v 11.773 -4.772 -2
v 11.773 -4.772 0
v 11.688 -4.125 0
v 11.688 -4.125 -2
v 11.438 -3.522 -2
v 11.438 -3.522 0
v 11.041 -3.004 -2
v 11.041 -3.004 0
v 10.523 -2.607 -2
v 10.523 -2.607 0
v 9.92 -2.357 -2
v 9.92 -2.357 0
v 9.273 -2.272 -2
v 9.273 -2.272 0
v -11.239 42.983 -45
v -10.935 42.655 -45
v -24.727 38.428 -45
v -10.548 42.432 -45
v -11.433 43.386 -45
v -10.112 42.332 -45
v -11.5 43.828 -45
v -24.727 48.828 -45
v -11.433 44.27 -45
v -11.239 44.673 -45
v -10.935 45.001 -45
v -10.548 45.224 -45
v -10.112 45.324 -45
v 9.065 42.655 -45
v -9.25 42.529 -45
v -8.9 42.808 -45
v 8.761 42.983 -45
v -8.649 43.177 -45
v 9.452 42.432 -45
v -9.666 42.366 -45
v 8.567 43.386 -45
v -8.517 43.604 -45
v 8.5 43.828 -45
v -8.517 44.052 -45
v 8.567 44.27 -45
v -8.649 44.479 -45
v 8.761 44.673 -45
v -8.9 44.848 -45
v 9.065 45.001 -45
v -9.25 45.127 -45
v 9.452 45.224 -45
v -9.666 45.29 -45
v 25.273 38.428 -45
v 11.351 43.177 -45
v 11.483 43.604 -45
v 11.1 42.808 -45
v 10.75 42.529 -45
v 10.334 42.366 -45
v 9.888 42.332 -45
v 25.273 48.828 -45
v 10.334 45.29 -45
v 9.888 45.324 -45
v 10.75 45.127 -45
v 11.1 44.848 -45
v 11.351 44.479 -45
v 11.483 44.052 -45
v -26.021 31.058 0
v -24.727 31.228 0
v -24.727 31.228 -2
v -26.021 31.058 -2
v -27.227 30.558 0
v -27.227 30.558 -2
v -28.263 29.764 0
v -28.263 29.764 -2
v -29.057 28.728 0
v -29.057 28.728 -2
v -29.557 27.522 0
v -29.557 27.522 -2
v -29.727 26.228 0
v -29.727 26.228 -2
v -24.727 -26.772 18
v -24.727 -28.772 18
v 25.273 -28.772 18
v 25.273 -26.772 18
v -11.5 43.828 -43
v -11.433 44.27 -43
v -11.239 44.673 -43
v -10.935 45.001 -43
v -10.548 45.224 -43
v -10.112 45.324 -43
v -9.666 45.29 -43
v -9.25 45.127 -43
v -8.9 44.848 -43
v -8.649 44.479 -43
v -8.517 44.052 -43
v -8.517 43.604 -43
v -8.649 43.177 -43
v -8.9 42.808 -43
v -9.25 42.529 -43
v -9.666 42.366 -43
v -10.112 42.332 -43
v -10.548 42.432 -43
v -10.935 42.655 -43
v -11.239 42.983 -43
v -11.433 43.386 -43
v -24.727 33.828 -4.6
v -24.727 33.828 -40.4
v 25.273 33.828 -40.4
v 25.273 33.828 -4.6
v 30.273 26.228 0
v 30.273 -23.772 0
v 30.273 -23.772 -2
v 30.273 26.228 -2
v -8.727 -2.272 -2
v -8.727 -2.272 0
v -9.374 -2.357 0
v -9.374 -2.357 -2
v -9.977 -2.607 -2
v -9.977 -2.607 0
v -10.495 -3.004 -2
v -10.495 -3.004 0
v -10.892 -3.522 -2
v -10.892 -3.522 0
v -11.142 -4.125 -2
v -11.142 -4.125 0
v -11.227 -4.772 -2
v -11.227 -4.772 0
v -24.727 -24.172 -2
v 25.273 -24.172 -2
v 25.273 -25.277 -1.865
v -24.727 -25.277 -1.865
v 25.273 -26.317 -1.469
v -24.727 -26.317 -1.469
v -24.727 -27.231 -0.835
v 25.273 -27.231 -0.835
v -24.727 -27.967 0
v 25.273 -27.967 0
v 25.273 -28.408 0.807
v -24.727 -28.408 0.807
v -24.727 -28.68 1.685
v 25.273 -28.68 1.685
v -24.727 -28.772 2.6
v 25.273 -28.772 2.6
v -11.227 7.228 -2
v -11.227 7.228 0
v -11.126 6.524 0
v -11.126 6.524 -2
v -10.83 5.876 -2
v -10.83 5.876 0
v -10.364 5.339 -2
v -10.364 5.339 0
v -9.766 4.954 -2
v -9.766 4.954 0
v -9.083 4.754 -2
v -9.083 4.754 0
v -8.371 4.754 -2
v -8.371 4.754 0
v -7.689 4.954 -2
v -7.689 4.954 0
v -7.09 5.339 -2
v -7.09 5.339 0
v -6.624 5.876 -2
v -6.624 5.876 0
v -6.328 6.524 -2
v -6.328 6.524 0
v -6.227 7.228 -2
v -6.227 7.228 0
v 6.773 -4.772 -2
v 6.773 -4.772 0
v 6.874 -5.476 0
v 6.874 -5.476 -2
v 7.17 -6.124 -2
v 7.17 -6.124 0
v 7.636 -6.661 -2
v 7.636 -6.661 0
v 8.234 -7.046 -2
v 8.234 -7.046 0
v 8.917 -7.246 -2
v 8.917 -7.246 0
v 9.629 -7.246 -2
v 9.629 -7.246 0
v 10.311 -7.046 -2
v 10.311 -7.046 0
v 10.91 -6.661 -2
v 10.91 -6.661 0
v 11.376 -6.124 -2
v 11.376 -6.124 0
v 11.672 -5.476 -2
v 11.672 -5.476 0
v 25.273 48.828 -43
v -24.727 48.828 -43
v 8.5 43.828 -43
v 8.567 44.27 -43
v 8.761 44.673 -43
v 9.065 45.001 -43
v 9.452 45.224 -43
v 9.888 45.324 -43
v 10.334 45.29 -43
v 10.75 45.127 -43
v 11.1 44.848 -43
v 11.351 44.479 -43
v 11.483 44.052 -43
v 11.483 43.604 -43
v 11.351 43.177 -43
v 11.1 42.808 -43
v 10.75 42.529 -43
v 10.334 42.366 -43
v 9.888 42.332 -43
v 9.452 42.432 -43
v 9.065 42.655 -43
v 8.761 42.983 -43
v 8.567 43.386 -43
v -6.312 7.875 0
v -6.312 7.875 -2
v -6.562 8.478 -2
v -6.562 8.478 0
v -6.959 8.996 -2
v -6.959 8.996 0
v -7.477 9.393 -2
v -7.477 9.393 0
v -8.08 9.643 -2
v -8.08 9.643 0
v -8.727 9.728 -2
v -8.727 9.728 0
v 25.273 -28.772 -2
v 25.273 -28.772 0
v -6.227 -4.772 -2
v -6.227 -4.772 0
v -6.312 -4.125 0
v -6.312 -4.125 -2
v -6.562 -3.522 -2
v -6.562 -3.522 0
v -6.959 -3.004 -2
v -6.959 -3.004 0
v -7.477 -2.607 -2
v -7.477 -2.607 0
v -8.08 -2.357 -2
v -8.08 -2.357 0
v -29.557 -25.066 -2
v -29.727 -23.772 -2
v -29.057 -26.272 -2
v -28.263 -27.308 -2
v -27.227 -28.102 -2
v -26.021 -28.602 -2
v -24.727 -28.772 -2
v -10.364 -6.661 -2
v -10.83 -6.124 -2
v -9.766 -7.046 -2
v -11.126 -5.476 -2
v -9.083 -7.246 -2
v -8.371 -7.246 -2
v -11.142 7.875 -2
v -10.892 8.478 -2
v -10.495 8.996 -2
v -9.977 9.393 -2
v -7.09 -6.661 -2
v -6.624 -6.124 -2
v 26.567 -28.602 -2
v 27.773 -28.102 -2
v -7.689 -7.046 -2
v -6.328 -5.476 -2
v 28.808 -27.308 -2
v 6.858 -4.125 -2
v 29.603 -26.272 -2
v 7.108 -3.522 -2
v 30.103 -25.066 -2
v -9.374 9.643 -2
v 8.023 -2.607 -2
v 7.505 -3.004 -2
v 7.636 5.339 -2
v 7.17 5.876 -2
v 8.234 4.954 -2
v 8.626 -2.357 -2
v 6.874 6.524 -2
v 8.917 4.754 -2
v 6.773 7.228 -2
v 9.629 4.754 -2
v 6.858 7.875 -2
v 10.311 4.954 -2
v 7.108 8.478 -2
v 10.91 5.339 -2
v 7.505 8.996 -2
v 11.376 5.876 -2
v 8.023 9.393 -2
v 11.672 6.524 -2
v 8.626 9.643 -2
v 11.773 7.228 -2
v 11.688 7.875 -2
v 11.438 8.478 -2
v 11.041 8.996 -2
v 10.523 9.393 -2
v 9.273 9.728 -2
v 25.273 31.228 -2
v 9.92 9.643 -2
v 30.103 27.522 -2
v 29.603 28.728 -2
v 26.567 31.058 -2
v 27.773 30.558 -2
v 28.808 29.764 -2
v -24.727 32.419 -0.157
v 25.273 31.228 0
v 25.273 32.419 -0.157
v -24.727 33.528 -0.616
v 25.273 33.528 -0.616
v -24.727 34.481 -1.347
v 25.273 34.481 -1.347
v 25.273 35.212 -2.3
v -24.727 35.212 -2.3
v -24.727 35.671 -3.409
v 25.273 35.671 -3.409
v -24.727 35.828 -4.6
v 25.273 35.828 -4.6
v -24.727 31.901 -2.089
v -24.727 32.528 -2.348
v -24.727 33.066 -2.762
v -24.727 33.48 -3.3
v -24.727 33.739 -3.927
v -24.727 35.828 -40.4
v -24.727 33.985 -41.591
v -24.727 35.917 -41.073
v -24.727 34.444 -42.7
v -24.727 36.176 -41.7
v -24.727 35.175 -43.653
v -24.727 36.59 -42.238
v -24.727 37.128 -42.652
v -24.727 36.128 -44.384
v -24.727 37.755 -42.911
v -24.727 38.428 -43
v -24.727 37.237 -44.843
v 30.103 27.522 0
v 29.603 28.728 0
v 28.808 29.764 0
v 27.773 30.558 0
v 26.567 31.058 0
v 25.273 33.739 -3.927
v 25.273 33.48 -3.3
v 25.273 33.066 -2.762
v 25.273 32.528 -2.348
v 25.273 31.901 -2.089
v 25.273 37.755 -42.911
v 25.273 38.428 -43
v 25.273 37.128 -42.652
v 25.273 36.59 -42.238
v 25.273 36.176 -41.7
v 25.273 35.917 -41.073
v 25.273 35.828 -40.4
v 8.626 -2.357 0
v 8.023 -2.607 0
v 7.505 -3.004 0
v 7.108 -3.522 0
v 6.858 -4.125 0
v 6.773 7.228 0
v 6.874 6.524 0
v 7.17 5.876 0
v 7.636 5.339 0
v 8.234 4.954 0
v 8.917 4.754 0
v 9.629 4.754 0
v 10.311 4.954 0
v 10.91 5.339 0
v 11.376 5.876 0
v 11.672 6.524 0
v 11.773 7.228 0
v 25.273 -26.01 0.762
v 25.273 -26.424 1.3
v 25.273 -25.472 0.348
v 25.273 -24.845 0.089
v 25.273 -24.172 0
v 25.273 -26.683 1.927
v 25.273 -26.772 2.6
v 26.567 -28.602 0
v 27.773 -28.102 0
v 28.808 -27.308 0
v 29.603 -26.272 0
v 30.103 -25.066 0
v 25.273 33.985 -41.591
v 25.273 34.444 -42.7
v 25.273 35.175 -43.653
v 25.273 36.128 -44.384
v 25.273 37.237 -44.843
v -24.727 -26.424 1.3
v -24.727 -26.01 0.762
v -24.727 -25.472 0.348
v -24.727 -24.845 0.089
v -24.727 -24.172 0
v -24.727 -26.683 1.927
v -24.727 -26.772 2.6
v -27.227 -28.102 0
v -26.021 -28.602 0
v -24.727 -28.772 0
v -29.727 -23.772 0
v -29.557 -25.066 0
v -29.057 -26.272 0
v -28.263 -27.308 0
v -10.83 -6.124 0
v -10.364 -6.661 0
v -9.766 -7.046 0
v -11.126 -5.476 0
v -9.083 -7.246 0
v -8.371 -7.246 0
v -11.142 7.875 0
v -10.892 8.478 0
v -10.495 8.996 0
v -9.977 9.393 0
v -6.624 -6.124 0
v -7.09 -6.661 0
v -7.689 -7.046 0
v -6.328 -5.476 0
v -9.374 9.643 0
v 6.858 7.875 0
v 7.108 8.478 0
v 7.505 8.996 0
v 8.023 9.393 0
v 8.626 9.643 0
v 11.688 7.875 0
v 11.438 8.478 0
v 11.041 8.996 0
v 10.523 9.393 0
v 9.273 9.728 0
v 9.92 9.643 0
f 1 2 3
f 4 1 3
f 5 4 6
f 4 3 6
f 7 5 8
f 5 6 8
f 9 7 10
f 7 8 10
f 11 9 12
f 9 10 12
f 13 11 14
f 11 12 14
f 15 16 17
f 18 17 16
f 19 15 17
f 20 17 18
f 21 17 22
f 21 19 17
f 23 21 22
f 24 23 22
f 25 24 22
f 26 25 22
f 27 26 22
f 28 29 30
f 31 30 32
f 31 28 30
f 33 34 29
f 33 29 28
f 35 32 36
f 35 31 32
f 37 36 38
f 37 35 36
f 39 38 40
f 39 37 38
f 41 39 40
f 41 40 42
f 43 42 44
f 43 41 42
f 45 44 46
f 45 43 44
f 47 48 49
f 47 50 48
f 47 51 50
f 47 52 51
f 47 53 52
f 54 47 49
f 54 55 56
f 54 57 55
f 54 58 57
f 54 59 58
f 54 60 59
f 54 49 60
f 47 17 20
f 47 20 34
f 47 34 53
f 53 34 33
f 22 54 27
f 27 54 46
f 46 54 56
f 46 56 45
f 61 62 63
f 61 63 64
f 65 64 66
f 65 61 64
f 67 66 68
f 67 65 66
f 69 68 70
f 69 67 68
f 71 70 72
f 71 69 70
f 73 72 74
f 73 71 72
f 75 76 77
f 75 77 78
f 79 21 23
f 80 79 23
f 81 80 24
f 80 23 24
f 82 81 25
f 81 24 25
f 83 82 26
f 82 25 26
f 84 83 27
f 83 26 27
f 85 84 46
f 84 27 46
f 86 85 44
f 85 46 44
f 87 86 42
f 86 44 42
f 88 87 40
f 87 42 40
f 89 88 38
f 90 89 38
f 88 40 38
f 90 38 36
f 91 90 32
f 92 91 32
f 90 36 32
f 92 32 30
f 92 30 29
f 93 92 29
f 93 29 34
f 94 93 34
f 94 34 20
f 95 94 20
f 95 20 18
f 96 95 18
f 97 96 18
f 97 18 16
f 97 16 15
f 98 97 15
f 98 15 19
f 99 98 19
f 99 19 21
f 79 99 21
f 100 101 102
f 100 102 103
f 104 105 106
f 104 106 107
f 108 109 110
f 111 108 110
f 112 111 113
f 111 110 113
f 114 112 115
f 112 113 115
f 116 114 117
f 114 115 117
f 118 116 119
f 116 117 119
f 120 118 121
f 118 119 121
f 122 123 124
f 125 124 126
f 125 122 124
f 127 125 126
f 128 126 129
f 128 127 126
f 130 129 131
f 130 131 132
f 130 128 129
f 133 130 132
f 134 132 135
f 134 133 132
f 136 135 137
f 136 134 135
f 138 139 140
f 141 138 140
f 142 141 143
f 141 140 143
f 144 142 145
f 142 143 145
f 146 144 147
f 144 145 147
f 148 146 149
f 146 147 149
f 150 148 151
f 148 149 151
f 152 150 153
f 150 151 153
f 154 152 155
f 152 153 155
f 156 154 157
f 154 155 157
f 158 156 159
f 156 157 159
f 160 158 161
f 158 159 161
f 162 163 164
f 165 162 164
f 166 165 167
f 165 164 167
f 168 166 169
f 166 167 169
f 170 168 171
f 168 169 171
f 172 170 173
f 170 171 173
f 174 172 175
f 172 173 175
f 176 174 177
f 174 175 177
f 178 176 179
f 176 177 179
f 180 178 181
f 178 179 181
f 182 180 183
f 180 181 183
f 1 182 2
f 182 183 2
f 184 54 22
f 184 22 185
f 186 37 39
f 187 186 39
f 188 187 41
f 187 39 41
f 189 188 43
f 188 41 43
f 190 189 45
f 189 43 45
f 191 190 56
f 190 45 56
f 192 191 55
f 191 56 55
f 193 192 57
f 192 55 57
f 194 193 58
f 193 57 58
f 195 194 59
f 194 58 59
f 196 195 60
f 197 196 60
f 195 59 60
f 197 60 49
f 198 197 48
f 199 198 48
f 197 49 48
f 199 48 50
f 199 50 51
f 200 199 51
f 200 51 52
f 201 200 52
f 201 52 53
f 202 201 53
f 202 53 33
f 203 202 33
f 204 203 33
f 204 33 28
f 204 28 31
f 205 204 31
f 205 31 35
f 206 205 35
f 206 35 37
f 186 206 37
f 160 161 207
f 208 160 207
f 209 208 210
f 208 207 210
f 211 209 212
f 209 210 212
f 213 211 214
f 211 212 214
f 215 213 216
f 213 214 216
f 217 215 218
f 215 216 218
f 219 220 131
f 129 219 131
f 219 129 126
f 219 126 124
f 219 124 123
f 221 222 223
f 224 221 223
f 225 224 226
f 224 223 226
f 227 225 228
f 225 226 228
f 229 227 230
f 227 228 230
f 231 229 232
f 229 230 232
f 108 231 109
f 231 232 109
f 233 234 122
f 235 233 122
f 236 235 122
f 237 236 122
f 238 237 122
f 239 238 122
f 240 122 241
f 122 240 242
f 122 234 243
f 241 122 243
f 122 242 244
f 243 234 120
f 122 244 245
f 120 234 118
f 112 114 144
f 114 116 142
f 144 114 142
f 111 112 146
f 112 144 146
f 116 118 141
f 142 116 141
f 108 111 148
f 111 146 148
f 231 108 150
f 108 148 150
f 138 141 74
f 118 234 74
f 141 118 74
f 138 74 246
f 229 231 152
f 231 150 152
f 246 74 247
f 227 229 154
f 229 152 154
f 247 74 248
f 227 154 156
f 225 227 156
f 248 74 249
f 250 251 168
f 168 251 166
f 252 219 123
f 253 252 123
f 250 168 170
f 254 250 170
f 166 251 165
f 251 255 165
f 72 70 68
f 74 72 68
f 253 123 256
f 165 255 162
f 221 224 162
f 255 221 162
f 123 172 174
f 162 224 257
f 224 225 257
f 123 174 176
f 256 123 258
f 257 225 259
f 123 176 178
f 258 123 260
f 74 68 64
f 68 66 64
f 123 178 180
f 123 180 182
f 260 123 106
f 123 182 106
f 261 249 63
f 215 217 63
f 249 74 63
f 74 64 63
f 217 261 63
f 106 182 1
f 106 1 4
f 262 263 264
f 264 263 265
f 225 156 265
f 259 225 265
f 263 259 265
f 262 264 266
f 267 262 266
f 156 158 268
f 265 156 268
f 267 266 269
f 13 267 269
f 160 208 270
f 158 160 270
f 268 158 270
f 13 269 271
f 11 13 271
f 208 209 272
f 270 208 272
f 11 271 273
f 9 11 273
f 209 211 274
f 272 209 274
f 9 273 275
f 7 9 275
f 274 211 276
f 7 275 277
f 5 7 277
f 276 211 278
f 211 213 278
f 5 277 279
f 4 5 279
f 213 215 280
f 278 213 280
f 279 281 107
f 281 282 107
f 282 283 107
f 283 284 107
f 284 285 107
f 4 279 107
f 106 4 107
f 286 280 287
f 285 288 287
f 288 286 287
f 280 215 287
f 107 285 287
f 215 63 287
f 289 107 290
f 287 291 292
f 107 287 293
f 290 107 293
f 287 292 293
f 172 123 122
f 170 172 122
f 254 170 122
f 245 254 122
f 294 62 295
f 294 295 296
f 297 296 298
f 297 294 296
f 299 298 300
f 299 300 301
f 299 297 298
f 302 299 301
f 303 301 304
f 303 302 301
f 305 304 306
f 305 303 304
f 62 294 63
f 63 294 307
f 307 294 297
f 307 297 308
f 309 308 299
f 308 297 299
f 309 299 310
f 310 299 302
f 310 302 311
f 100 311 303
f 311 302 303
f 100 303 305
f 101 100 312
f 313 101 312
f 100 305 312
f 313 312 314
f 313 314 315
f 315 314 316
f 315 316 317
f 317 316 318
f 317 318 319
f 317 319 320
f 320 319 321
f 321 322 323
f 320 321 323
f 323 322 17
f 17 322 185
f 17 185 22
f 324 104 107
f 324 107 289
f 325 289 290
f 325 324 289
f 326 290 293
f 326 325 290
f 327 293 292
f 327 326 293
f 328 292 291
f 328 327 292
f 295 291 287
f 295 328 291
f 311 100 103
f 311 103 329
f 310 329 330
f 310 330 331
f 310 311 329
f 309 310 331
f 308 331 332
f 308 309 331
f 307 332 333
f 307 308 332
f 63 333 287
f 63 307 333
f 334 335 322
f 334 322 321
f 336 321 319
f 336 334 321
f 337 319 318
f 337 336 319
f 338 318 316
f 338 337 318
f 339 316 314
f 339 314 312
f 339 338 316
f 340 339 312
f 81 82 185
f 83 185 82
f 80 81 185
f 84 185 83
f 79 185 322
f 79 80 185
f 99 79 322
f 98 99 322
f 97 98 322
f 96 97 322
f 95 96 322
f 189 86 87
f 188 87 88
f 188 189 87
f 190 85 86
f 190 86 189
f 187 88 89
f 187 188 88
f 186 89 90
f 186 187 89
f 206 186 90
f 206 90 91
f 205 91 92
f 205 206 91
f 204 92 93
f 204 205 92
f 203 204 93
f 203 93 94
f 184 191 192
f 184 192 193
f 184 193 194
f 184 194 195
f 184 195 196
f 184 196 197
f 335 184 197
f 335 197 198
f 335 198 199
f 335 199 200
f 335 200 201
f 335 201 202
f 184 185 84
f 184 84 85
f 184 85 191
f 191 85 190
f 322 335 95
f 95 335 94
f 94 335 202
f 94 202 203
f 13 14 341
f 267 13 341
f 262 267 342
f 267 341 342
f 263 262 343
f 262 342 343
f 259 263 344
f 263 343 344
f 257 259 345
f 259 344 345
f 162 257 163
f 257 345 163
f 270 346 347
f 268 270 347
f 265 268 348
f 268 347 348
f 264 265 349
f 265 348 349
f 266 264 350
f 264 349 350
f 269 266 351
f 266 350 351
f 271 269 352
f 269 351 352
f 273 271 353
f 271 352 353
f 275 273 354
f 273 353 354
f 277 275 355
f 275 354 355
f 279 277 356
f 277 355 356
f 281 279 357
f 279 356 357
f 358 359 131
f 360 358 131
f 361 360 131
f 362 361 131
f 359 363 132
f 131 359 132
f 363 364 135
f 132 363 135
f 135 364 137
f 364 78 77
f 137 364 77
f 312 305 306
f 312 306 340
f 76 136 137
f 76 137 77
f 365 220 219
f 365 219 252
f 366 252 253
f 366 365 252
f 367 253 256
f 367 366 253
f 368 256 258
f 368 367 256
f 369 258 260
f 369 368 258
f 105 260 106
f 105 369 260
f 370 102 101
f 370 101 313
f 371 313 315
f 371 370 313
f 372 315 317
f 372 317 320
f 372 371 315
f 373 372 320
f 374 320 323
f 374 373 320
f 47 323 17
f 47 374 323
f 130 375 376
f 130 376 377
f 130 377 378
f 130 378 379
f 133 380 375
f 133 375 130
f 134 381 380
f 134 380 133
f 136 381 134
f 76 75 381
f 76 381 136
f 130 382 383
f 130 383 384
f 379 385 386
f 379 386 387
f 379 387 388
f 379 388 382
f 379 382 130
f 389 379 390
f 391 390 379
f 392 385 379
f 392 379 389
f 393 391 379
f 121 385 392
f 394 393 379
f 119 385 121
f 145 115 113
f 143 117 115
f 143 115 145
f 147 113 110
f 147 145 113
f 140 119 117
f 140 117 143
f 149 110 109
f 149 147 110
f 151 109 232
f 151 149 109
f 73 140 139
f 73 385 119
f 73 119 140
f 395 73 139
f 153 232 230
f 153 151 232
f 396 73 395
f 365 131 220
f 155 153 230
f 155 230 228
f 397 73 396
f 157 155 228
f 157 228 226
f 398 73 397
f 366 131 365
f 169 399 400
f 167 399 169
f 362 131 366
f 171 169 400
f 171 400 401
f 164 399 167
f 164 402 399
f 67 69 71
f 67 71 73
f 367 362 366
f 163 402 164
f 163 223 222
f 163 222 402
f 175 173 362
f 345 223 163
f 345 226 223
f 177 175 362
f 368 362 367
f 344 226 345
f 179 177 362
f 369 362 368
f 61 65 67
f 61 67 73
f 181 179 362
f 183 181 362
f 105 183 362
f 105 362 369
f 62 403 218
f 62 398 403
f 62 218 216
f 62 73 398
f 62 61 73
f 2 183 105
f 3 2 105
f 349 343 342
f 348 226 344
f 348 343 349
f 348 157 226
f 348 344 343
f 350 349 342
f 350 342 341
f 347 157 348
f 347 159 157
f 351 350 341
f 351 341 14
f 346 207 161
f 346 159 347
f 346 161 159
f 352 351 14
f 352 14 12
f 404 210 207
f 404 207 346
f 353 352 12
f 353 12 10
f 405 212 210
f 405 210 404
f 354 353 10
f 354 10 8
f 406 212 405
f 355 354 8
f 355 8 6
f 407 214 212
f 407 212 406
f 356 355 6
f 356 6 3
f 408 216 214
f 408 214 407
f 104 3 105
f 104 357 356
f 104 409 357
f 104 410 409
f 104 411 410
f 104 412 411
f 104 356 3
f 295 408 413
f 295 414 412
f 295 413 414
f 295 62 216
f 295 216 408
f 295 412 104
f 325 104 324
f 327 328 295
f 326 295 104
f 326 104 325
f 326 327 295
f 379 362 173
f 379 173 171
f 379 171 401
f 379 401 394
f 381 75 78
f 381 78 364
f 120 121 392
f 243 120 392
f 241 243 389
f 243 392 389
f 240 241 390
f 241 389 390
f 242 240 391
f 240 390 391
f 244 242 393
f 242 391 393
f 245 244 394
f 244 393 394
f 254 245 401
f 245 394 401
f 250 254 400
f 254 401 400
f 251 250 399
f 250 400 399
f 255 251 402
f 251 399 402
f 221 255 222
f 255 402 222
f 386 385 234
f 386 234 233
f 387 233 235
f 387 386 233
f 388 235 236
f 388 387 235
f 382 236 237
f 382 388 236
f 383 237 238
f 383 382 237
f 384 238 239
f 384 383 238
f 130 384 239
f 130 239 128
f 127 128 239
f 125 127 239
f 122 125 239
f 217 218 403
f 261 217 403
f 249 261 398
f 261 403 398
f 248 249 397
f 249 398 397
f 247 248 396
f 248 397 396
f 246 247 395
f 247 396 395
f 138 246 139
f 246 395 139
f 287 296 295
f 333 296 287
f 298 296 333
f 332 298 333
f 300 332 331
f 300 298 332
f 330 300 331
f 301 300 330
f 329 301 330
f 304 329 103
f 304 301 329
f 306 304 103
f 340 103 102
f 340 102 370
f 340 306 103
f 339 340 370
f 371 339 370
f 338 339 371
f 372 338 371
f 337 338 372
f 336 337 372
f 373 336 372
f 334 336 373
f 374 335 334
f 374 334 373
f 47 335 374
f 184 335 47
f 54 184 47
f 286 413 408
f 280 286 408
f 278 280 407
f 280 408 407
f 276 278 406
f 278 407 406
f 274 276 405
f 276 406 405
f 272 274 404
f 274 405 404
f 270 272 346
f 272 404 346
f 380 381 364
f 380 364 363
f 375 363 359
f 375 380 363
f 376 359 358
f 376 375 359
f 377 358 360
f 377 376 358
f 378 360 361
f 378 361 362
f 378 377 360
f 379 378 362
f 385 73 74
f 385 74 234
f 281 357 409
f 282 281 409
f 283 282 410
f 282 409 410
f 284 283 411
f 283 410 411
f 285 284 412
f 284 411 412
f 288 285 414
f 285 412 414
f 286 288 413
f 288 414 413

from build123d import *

# Parameters (mm, degrees)
BASE_FLANGE2_DEPTH           = 2
EDGE_FLANGE1_DEPTH           = 50
EDGE_FLANGE2_STRIP_W         = 13.2
EDGE_FLANGE2_STRIP_H         = 2
EDGE_FLANGE2_STRIP_CUT_DEPTH = 50
EDGE_FLANGE2_DEPTH           = 50
SKETCH18_R                   = 1.5
CUT_EXTRUDE1_DEPTH           = 10
EDGE_FLANGE3_STRIP_W         = 13.2
EDGE_FLANGE3_STRIP_H         = 2
EDGE_FLANGE3_STRIP_CUT_DEPTH = 50
EDGE_FLANGE3_DEPTH           = 50


# Sheet-metal steps are written as plain solids
with BuildPart() as part:
    # Sketch1 → Base-Flange2 (new body)
    with BuildSketch(Plane.XY):
        with BuildLine():
            Line((25.272889038, 31.228000671), (-24.727110962, 31.228000671))
            ThreePointArc((-24.727110962, 31.228000671), (-28.262644868, 29.763534577), (-29.727110962, 26.228000671))
            Line((-29.727110962, 26.228000671), (-29.727110962, -23.771999329))
            ThreePointArc((-29.727110962, -23.771999329), (-28.262644868, -27.307533234), (-24.727110962, -28.771999329))
            Line((-24.727110962, -28.771999329), (25.272889038, -28.771999329))
            ThreePointArc((25.272889038, -28.771999329), (28.808422944, -27.307533234), (30.272889038, -23.771999329))
            Line((30.272889038, -23.771999329), (30.272889038, 26.228000671))
            ThreePointArc((30.272889038, 26.228000671), (28.808422944, 29.763534577), (25.272889038, 31.228000671))
        make_face()
        with BuildLine():
            ThreePointArc((11.772817004, -4.771999329), (11.040605056, -3.004283311), (9.272889038, -2.272071362))
            ThreePointArc((9.272889038, -2.272071362), (7.505173021, -3.004283311), (6.772961072, -4.771999329))
            ThreePointArc((6.772961072, -4.771999329), (9.272889038, -7.271927295), (11.772817004, -4.771999329))
        make_face(mode=Mode.SUBTRACT)
        with BuildLine():
            ThreePointArc((-8.727110962, -2.272071362), (-10.494826979, -3.004283311), (-11.227038928, -4.771999329))
            ThreePointArc((-11.227038928, -4.771999329), (-8.727110962, -7.271927295), (-6.227182996, -4.771999329))
            ThreePointArc((-6.227182996, -4.771999329), (-6.959394944, -3.004283311), (-8.727110962, -2.272071362))
        make_face(mode=Mode.SUBTRACT)
        with BuildLine():
            ThreePointArc((6.772961072, 7.228000671), (9.272889038, 4.728072705), (11.772817004, 7.228000671))
            ThreePointArc((11.772817004, 7.228000671), (11.040605056, 8.995716689), (9.272889038, 9.727928638))
            ThreePointArc((9.272889038, 9.727928638), (7.505173021, 8.995716689), (6.772961072, 7.228000671))
        make_face(mode=Mode.SUBTRACT)
        with BuildLine():
            ThreePointArc((-8.727110962, 9.727928638), (-10.494826979, 8.995716689), (-11.227038928, 7.228000671))
            ThreePointArc((-11.227038928, 7.228000671), (-8.727110962, 4.728072705), (-6.227182996, 7.228000671))
            ThreePointArc((-6.227182996, 7.228000671), (-6.959394944, 8.995716689), (-8.727110962, 9.727928638))
        make_face(mode=Mode.SUBTRACT)
    extrude(amount=-BASE_FLANGE2_DEPTH)

    # Edge-Flange1 section (across the edge) → Edge-Flange1 (add)
    with BuildSketch(Plane(origin=(-24.727110962, 33.828000671, -2), x_dir=(0, -1, 0), z_dir=(1, 0, 0))):
        with BuildLine():
            Line((-2, 2.6), (-2, 43))
            Line((-2, 43), (0, 43))
            Line((0, 43), (0, 2.6))
            ThreePointArc((0, 2.6), (0.761522369, 0.761522369), (2.6, 0))
            Line((2.6, 0), (2.6, -2))
            ThreePointArc((2.6, -2), (-0.652691193, -0.652691193), (-2, 2.6))
        make_face()
    extrude(amount=EDGE_FLANGE1_DEPTH)

    # Edge-Flange2 strip (across the edge) → Edge-Flange2 strip cut (cut)
    with BuildSketch(Plane(origin=(25.272889038, 35.828000671, -45), x_dir=(0, 0, 1), z_dir=(-1, 0, 0))):
        with Locations((-2, -1)):
            Rectangle(EDGE_FLANGE2_STRIP_W, EDGE_FLANGE2_STRIP_H)
    extrude(amount=EDGE_FLANGE2_STRIP_CUT_DEPTH, mode=Mode.SUBTRACT)

    # Edge-Flange2 section (across the edge) → Edge-Flange2 (add)
    with BuildSketch(Plane(origin=(25.272889038, 35.828000671, -45), x_dir=(0, 0, 1), z_dir=(-1, 0, 0))):
        with BuildLine():
            Line((0, 2.6), (0, 13))
            Line((0, 13), (2, 13))
            Line((2, 13), (2, 2.6))
            ThreePointArc((2, 2.6), (2.761522369, 0.761522369), (4.6, 0))
            Line((4.6, 0), (4.6, -2))
            ThreePointArc((4.6, -2), (1.347308807, -0.652691193), (0, 2.6))
        make_face()
    extrude(amount=EDGE_FLANGE2_DEPTH)

    # Sketch18 → Cut-Extrude1 (cut)
    with BuildSketch(Plane(origin=(0, 0, -45), x_dir=(-1, 0, 0), z_dir=(0, 0, -1))):
        with Locations((-10, 43.828000671)):
            Circle(SKETCH18_R)
        with Locations((10, 43.828000671)):
            Circle(SKETCH18_R)
    extrude(amount=-CUT_EXTRUDE1_DEPTH, mode=Mode.SUBTRACT)

    # Edge-Flange3 strip (across the edge) → Edge-Flange3 strip cut (cut)
    with BuildSketch(Plane(origin=(-24.727110962, -28.771999329, 0), x_dir=(0, 1, 0), z_dir=(1, 0, 0))):
        with Locations((-2, -1)):
            Rectangle(EDGE_FLANGE3_STRIP_W, EDGE_FLANGE3_STRIP_H)
    extrude(amount=EDGE_FLANGE3_STRIP_CUT_DEPTH, mode=Mode.SUBTRACT)

    # Edge-Flange3 section (across the edge) → Edge-Flange3 (add)
    with BuildSketch(Plane(origin=(-24.727110962, -28.771999329, 0), x_dir=(0, 1, 0), z_dir=(1, 0, 0))):
        with BuildLine():
            Line((0, 2.6), (0, 18))
            Line((0, 18), (2, 18))
            Line((2, 18), (2, 2.6))
            ThreePointArc((2, 2.6), (2.761522369, 0.761522369), (4.6, 0))
            Line((4.6, 0), (4.6, -2))
            ThreePointArc((4.6, -2), (1.347308807, -0.652691193), (0, 2.6))
        make_face()
    extrude(amount=EDGE_FLANGE3_DEPTH)


solid = part.part
